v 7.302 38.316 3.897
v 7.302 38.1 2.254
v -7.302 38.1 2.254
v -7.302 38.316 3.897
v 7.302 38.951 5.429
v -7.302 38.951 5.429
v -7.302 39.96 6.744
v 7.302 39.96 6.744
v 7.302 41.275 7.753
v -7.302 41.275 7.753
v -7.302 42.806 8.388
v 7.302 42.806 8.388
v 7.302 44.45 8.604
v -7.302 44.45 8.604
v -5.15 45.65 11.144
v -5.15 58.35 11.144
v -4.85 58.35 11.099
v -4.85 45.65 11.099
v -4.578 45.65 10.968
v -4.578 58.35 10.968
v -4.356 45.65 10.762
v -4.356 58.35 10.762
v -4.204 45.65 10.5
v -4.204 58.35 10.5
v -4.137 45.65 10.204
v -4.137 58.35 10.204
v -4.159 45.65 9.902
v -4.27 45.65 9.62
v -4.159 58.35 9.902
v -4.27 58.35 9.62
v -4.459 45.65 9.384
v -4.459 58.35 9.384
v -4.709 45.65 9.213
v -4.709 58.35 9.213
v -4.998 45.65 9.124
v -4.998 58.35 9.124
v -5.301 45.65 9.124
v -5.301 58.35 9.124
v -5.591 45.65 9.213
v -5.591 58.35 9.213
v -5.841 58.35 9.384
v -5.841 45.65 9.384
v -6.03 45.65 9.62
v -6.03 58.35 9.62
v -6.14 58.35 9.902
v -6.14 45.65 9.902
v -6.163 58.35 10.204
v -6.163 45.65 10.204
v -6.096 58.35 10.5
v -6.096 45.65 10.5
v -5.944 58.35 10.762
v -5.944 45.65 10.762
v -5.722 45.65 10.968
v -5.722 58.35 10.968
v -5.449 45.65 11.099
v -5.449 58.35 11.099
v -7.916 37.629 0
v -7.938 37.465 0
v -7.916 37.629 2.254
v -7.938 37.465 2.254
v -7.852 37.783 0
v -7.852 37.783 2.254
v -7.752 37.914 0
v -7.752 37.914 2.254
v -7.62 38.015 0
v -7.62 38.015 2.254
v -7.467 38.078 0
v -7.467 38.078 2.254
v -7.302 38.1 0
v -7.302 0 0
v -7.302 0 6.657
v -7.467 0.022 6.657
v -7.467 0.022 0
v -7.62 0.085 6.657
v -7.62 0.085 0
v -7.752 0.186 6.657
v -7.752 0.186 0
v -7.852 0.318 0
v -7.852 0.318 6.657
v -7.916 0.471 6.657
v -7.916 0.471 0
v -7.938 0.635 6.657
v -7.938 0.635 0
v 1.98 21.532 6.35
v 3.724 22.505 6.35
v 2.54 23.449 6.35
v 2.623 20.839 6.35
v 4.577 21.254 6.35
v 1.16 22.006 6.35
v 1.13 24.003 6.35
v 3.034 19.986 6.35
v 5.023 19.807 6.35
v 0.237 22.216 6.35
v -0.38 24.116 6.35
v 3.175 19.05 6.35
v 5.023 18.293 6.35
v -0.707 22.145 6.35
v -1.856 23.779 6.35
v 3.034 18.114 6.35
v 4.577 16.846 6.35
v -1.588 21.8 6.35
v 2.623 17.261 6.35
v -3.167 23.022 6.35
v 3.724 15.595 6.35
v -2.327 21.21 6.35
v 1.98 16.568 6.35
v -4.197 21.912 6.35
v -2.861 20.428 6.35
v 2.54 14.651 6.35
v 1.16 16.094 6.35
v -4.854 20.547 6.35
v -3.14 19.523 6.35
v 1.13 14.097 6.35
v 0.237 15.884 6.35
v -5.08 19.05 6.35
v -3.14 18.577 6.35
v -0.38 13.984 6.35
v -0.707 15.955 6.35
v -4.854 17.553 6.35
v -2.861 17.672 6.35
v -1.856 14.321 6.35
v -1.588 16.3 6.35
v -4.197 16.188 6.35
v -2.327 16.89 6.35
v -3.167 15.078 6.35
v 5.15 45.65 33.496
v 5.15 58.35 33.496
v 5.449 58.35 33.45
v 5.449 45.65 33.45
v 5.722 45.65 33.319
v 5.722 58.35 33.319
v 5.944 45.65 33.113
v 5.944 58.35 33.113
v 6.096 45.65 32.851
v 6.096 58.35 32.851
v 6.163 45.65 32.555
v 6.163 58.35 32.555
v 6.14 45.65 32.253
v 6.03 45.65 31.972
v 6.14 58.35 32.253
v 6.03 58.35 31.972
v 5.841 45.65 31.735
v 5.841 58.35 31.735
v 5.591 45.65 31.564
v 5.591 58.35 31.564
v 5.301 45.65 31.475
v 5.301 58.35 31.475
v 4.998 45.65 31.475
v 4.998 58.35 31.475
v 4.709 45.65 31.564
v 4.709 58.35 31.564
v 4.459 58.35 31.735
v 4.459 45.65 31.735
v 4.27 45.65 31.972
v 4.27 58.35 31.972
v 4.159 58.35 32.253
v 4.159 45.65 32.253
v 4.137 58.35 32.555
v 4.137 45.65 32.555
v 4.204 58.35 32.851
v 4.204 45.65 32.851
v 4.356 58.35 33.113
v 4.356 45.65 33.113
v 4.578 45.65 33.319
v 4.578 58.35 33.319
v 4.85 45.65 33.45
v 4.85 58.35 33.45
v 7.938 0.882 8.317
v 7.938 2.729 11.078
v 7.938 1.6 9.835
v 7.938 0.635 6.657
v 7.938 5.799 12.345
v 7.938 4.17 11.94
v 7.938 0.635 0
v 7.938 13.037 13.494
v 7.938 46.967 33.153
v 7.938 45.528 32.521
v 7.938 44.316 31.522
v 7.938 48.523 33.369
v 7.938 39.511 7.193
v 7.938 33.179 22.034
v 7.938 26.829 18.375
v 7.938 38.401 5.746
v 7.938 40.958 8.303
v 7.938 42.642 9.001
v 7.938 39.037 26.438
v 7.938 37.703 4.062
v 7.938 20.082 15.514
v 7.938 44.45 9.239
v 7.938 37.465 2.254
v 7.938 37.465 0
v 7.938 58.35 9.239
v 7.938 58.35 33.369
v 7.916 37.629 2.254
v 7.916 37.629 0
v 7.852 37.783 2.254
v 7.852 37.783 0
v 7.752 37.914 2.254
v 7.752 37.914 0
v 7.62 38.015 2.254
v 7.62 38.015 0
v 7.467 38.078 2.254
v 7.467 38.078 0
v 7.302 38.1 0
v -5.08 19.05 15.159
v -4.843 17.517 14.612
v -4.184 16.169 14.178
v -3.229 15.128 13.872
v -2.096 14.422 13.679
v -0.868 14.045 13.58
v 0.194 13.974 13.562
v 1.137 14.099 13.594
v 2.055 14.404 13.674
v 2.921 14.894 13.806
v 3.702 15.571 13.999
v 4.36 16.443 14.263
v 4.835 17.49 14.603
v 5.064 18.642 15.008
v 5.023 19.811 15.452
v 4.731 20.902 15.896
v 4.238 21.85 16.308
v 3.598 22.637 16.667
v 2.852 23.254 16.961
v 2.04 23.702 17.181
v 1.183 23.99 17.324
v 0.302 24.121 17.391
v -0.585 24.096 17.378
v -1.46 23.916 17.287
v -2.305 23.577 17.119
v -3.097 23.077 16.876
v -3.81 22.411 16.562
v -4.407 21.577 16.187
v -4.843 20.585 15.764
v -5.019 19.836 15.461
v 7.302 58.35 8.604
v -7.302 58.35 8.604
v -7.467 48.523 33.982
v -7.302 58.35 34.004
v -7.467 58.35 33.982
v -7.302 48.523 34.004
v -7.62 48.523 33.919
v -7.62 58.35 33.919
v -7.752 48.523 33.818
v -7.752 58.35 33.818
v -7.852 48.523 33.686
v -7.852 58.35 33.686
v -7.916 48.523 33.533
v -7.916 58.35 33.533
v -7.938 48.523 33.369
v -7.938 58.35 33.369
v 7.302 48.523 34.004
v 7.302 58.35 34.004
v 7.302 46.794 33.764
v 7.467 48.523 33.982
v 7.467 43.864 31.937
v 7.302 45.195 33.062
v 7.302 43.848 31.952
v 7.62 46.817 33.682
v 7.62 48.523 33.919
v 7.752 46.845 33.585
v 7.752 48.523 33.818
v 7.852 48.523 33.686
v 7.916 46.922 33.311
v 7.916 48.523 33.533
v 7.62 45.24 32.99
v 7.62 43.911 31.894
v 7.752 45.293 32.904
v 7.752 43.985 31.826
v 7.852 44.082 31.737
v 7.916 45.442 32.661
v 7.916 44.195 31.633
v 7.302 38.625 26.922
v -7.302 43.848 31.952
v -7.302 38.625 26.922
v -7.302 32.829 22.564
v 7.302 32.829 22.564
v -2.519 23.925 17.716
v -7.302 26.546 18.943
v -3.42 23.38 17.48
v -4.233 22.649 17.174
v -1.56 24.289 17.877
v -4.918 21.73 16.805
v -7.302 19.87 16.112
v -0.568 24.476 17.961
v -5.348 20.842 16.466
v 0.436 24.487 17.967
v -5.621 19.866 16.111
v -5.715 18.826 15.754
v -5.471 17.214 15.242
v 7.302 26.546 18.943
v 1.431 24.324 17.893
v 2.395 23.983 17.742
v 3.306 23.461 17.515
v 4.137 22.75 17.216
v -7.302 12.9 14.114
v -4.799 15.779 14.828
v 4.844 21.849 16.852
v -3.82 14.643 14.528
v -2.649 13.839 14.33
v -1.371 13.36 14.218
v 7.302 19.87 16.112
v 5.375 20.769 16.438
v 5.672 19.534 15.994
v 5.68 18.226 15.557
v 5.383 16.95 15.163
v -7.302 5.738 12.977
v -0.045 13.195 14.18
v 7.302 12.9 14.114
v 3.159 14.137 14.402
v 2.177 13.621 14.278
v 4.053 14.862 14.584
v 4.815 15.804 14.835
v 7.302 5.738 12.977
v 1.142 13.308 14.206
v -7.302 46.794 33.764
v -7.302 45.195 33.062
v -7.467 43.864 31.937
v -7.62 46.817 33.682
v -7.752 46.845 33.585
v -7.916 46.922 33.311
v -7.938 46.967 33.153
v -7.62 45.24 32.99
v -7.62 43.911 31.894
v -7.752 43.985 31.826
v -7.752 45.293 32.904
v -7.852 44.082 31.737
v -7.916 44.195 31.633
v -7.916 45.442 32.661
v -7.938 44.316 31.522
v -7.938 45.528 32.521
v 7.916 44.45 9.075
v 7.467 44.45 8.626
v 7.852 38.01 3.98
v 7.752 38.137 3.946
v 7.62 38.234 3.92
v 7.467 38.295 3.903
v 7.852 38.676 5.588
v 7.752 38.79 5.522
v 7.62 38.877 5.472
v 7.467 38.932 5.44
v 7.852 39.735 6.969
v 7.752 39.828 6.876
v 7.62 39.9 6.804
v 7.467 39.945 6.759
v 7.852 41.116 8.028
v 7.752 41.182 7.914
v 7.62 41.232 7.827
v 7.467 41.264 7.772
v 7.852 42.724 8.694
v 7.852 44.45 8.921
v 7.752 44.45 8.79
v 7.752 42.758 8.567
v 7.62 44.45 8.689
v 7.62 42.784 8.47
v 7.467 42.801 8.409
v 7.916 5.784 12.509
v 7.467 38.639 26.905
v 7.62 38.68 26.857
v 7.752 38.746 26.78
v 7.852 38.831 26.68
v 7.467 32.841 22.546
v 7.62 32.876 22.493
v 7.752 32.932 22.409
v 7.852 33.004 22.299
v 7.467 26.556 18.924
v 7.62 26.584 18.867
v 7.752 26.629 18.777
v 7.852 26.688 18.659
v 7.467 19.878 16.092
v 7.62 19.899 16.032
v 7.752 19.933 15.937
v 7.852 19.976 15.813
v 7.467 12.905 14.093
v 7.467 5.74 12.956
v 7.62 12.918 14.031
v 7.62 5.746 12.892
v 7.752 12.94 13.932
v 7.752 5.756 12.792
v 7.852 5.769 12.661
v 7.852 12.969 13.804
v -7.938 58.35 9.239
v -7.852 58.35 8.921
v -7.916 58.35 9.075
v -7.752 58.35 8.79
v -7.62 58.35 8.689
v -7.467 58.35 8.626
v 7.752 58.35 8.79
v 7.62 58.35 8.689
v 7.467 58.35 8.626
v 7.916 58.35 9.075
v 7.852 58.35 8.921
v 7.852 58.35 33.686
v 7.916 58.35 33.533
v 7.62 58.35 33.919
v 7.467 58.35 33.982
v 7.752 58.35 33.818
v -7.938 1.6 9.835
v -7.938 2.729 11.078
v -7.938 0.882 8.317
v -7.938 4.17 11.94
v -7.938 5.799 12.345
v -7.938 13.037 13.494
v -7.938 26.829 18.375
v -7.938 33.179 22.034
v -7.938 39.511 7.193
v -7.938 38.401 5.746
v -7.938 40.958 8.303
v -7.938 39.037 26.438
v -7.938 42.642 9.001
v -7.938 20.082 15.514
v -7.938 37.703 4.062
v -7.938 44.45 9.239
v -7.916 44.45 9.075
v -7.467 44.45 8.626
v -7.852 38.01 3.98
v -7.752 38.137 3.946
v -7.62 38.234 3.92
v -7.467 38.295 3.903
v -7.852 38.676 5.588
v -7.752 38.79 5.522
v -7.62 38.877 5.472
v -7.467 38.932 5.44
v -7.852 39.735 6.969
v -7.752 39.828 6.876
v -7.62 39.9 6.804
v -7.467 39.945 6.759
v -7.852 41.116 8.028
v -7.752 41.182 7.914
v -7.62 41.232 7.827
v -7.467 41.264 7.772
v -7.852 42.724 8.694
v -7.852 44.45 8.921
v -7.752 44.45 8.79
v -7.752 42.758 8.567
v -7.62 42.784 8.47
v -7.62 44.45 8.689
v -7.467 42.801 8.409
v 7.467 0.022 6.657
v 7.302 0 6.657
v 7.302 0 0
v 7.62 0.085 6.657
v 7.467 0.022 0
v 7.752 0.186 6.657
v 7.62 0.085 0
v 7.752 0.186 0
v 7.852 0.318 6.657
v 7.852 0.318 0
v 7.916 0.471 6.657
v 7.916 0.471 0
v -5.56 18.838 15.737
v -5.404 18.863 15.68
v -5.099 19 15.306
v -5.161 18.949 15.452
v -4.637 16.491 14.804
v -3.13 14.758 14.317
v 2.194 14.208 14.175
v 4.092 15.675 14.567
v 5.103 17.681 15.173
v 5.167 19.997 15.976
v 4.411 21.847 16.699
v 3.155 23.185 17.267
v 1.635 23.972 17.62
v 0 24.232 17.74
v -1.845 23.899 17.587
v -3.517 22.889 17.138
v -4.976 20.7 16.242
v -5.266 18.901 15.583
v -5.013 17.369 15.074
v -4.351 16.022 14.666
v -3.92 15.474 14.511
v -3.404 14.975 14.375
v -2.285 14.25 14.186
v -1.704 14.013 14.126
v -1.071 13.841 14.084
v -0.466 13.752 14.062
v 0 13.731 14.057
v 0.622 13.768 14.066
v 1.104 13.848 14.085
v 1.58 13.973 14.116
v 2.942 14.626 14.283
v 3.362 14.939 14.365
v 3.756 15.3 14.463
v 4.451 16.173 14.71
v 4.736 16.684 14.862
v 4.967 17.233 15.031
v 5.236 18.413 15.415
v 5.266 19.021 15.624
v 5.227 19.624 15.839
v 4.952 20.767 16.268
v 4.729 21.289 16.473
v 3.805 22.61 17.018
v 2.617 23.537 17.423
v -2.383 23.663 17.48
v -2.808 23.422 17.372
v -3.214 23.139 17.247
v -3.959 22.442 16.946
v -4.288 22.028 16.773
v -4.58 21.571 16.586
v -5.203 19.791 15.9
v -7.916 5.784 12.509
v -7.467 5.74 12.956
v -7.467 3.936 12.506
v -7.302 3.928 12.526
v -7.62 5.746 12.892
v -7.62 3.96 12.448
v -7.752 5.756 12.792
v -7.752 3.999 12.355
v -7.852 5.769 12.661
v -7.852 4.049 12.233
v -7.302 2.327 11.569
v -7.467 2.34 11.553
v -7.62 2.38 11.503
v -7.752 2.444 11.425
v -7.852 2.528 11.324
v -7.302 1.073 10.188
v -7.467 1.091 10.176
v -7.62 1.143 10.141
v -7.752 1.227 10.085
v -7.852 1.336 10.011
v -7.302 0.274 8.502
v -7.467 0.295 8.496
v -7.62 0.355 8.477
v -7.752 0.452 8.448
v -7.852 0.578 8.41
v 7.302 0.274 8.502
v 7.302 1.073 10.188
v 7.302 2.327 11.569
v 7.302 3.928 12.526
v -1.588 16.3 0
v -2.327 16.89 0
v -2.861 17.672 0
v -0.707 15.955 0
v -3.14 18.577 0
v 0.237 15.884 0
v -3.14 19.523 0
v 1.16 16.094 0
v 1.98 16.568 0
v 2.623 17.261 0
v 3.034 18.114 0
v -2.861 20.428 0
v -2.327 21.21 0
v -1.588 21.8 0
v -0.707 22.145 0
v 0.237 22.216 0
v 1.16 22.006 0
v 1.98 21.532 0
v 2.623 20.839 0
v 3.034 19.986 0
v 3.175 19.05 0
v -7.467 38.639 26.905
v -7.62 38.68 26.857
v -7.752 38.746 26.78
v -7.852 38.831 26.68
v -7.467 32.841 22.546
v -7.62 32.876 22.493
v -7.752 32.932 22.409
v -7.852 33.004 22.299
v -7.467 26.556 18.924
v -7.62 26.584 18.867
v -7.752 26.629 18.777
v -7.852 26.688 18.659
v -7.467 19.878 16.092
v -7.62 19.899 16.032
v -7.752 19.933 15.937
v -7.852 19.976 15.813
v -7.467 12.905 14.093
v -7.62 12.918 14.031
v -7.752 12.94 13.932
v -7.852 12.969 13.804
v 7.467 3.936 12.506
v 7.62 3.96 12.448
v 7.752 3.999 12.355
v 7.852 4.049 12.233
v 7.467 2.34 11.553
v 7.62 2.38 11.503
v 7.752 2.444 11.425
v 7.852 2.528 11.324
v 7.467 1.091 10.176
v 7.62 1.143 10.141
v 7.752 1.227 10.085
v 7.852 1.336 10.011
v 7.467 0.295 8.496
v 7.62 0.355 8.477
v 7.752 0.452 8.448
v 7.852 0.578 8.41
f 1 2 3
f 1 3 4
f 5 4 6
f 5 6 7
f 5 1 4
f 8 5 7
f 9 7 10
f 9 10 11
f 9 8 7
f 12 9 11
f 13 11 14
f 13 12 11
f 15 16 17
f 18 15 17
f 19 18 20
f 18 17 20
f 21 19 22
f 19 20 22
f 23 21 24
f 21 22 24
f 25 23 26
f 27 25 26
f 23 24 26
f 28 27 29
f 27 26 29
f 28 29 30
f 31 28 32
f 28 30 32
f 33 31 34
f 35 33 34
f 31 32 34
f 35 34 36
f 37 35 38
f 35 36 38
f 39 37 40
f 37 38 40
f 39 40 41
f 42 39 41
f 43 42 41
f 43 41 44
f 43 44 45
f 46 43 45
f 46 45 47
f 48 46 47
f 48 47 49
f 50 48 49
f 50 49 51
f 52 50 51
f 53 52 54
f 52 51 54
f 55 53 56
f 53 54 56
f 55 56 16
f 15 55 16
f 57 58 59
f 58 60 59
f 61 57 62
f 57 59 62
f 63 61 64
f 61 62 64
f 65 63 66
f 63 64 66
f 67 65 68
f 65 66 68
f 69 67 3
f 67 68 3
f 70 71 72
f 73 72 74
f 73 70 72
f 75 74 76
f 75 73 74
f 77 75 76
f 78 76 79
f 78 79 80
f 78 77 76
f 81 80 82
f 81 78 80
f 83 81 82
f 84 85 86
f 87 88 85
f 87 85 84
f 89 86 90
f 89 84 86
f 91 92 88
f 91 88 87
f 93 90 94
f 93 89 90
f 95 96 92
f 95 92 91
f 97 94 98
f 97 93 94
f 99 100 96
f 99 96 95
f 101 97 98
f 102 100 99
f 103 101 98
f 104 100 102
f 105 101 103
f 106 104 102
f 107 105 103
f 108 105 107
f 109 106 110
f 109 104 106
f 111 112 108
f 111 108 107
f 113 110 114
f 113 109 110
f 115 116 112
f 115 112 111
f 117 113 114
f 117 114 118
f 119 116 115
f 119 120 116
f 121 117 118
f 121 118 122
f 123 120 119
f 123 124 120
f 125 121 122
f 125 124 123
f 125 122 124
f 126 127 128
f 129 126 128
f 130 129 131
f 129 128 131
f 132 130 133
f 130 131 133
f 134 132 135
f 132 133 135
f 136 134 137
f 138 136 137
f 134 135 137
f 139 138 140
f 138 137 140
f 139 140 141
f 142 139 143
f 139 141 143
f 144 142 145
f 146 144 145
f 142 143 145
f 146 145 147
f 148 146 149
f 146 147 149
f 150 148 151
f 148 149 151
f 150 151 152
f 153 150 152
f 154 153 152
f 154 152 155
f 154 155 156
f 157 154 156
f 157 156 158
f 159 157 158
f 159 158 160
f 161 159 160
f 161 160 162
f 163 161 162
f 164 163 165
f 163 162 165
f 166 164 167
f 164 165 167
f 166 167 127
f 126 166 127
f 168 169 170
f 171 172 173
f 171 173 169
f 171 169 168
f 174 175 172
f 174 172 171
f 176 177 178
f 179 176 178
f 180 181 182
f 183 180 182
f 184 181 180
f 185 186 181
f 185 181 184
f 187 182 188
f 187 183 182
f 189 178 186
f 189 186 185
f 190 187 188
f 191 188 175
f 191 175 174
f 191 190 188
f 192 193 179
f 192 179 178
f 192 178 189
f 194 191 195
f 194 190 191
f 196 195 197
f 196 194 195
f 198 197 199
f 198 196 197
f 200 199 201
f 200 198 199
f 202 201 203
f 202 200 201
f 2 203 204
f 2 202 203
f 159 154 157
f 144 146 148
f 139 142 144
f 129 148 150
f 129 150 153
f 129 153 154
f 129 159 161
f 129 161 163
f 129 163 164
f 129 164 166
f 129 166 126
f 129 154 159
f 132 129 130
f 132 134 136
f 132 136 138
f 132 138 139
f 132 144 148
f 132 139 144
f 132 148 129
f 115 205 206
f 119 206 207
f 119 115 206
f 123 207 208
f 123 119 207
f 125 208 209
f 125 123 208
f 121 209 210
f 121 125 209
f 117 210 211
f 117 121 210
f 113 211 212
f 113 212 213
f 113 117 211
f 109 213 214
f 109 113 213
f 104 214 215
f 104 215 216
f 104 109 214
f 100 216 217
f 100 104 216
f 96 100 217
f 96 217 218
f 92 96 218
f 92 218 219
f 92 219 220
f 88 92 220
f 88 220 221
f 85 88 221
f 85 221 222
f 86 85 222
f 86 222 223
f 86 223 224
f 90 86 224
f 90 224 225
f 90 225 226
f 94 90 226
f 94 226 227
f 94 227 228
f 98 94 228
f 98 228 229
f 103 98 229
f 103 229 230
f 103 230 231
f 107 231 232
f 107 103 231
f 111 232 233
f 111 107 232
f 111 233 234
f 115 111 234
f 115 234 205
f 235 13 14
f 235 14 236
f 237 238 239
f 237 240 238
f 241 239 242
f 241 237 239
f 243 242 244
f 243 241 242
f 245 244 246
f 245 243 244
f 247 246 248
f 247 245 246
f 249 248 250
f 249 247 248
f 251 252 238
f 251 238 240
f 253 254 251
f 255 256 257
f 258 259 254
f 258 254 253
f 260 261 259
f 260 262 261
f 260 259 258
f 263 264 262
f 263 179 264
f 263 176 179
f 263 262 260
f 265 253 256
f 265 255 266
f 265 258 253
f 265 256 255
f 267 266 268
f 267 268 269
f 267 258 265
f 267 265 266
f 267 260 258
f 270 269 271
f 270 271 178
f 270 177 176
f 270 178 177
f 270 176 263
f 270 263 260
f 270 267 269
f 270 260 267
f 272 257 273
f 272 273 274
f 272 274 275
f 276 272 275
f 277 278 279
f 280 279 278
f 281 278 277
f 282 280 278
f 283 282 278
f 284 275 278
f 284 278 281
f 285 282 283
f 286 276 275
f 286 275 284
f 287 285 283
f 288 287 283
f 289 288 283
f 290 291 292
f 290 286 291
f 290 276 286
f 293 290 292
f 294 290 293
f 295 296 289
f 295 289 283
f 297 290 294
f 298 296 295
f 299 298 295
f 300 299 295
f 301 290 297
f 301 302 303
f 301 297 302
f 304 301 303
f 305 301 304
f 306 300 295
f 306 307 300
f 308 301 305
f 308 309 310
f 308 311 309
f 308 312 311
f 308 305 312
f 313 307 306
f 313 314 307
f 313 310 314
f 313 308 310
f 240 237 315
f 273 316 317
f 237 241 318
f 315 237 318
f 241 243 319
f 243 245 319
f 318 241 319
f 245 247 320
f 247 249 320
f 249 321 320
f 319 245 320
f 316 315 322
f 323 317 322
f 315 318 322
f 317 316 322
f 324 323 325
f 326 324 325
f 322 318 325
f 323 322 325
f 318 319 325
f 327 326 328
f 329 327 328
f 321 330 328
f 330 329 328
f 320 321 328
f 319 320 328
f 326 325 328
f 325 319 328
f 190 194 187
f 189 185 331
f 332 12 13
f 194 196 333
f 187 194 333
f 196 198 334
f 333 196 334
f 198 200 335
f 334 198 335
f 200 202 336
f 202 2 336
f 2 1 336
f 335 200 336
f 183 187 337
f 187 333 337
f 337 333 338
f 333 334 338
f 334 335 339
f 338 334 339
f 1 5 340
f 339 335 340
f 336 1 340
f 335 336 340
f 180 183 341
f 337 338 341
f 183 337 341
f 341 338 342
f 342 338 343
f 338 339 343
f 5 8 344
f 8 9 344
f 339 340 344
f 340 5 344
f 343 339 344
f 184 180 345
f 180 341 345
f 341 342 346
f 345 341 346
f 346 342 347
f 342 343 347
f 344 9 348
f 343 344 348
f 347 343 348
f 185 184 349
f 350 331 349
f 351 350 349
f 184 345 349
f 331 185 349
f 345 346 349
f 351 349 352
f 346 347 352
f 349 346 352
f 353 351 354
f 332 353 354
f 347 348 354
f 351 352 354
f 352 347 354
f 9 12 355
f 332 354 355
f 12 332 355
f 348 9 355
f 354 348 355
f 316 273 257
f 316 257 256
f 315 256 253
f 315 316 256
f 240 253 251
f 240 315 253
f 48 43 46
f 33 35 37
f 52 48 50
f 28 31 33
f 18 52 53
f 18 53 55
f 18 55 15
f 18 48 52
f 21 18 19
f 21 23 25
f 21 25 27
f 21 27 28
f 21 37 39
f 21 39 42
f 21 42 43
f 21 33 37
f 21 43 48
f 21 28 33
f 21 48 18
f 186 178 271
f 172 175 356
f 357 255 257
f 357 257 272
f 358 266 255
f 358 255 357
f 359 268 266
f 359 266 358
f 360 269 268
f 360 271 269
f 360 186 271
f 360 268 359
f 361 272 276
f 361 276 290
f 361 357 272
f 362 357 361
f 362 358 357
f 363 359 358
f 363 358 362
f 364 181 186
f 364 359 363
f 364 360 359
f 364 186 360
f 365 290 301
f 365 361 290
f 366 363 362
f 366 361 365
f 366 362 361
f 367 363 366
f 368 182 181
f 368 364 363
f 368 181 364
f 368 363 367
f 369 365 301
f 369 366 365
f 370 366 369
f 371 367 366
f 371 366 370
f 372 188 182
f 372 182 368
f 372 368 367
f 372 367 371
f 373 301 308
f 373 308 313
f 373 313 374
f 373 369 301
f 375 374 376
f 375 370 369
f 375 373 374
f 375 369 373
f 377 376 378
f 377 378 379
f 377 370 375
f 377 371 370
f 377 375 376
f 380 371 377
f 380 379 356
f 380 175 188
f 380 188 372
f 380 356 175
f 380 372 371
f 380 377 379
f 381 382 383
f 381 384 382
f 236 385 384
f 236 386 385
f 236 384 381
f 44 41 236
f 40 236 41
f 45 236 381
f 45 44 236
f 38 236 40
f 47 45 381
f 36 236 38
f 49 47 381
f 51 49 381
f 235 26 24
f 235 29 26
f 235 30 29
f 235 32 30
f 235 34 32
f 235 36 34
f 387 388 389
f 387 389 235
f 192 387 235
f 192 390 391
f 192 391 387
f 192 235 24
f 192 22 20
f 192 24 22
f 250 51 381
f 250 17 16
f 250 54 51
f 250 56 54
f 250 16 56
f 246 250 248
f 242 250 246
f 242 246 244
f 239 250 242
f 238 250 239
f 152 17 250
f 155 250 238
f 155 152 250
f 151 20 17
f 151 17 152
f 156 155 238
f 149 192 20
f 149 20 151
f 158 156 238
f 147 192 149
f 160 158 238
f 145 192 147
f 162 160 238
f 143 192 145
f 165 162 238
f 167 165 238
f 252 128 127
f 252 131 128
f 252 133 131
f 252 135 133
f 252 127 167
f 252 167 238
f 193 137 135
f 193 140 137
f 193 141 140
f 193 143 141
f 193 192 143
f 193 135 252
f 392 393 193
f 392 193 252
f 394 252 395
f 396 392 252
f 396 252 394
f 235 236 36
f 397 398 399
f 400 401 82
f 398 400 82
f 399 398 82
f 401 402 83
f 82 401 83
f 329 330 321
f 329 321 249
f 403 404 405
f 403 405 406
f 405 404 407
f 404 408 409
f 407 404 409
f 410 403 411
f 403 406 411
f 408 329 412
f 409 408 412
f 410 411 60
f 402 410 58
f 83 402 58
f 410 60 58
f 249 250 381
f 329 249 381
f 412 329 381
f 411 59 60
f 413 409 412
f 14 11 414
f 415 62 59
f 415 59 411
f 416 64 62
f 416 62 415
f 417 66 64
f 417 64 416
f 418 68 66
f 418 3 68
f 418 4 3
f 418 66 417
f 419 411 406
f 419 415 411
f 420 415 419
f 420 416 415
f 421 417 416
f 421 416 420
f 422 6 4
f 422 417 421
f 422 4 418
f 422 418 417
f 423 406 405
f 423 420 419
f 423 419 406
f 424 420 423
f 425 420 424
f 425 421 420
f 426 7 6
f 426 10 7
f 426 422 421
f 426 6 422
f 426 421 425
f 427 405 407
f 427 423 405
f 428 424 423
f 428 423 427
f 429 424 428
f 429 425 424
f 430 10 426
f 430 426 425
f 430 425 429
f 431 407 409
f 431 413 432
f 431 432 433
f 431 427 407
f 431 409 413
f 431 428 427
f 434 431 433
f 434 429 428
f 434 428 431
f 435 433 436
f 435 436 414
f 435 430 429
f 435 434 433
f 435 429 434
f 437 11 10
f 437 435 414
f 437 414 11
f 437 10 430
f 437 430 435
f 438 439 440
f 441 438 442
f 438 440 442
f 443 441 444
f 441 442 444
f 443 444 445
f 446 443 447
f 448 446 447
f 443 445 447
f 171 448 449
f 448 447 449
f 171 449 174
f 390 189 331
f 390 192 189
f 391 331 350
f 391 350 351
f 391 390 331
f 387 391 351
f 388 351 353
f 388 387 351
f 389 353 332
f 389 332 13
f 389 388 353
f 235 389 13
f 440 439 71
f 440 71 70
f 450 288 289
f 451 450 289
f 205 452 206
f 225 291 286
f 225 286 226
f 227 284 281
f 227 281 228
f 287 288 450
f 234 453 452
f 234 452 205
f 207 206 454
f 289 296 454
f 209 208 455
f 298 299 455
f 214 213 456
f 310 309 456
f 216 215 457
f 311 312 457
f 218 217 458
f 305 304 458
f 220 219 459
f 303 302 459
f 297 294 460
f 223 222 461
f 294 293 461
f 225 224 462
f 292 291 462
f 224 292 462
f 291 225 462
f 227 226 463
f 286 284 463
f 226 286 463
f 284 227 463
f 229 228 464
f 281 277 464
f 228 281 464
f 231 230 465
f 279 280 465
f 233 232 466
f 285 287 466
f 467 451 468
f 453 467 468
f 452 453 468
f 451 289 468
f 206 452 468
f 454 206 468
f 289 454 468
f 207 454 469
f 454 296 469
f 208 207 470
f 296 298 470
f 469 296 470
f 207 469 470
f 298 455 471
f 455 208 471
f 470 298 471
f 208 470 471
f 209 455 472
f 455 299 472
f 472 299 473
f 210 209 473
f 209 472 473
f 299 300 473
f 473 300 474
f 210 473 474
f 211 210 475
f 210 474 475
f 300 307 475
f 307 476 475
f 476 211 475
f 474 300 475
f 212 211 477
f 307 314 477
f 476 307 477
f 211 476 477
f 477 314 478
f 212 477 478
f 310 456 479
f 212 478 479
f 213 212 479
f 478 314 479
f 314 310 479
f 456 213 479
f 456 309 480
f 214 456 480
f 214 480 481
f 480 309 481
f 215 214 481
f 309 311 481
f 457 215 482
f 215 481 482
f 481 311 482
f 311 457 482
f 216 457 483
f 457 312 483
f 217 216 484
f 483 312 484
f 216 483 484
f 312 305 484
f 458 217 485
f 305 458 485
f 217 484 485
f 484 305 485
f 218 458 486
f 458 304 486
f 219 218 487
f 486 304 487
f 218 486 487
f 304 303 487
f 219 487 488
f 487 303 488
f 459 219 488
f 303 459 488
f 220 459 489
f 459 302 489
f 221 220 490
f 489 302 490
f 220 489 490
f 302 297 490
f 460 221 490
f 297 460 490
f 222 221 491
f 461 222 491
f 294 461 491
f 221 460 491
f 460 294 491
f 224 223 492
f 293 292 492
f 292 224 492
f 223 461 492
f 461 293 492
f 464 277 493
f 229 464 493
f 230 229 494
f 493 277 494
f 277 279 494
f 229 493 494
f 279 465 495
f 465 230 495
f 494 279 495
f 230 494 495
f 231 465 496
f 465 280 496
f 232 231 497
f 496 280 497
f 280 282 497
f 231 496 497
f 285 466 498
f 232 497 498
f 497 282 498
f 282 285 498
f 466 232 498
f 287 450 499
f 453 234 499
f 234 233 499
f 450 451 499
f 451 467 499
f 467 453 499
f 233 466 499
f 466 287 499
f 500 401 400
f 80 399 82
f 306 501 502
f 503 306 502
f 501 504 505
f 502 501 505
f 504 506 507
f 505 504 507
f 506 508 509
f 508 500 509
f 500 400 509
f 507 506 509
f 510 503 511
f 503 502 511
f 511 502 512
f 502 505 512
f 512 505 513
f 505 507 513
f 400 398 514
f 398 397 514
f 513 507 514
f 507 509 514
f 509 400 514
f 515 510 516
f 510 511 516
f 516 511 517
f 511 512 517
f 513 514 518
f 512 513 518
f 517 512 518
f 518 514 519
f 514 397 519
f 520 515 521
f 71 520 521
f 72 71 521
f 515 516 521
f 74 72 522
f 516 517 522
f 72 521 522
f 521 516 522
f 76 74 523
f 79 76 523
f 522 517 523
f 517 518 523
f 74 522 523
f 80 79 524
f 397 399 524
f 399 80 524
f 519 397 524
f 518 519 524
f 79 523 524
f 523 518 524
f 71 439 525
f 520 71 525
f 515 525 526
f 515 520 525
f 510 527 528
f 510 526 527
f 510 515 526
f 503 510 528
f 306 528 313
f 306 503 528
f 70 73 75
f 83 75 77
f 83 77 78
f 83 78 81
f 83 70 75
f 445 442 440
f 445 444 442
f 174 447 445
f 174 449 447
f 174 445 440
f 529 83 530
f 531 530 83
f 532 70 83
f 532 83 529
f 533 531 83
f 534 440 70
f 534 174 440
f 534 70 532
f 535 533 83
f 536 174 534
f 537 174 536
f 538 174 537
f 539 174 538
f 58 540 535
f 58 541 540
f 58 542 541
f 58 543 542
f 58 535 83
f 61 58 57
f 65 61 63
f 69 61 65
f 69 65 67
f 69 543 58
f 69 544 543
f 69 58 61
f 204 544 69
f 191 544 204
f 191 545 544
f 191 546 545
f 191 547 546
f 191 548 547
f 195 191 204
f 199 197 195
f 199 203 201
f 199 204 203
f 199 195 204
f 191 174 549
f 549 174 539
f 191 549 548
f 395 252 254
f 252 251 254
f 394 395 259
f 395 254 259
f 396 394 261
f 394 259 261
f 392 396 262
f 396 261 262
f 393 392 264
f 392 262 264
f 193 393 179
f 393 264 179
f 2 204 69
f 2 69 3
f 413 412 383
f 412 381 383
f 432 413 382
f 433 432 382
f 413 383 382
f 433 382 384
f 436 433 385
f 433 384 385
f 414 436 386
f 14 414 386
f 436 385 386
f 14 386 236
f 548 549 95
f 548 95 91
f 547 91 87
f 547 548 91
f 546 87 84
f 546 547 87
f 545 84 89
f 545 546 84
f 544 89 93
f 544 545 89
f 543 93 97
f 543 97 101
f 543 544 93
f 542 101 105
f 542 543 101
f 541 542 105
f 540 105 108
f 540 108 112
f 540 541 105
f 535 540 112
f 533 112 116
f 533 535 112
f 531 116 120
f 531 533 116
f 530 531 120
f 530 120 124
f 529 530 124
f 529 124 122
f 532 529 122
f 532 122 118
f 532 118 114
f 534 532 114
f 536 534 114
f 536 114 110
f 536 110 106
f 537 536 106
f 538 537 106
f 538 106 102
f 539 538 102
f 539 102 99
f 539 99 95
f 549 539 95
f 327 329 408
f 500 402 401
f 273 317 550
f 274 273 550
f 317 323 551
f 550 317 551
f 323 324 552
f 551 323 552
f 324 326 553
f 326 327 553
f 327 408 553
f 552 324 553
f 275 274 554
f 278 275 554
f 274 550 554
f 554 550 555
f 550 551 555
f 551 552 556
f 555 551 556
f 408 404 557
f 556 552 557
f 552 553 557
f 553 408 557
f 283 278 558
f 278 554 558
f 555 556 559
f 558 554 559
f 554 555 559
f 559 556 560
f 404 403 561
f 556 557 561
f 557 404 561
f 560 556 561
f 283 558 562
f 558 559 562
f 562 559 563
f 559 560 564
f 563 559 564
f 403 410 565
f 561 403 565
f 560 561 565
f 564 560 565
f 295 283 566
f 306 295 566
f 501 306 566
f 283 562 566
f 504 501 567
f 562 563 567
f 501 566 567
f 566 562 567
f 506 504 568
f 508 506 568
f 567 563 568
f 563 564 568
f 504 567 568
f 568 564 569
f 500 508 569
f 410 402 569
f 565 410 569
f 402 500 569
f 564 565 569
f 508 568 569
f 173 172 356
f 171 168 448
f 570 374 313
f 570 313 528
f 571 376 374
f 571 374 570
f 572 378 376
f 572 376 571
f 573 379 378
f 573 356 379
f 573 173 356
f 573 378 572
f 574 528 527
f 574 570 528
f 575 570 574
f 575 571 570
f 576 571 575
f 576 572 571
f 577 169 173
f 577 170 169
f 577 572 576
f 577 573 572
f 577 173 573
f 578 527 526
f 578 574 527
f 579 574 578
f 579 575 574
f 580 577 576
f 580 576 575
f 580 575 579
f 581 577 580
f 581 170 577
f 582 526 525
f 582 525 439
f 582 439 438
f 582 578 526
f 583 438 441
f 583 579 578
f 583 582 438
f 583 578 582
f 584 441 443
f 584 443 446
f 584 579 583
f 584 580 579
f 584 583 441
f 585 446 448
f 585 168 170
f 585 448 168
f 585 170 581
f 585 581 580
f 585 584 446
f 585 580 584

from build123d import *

# Parameters (mm, degrees)
BOSS_EXTRUDE1_DEPTH     = 7.9375
CUT_EXTRUDE1_DEPTH      = 69.000110012
CUT_EXTRUDE1_DEPTH_BACK = 69.000110012
SKETCH2_R               = 3.175
CUT_EXTRUDE4_START      = 6.35
SKETCH2_3_R             = 5.08
SKETCH2_3_R_2           = 3.175
CUT_EXTRUDE4_DEPTH      = 62.650110074
SKETCH3_R               = 1.016
CUT_EXTRUDE2_DEPTH      = 12.7
FILLET1_R               = 6.35
FILLET2_R               = 0.635


with BuildPart() as part:
    # Sketch1 → Boss-Extrude1 (new, symmetric)
    with BuildSketch(Plane(origin=(0, 0, 0), x_dir=(0, 0, -1), z_dir=(1, 0, 0))):
        with BuildLine():
            Line((-12.7, 0), (0, 0))
            Line((0, 0), (0, 38.1))
            Line((0, 38.1), (-8.603985801, 38.1))
            Line((-8.603985801, 38.1), (-8.603985801, 58.35015))
            Line((-8.603985801, 58.35015), (-34.003985801, 58.35015))
            Line((-34.003985801, 58.35015), (-34.003985801, 45.65015))
            ThreePointArc((-34.003985801, 45.65015), (-18.28813969, 25.18827111), (-12.7, 0))
        make_face()
    extrude(amount=BOSS_EXTRUDE1_DEPTH, both=True)

    # Sketch2 → Cut-Extrude1 (cut, two sides: drawn at the far end of the back side and taken through both)
    with BuildSketch(Plane.XY.offset(-CUT_EXTRUDE1_DEPTH_BACK)):
        with Locations((0, 19.05)):
            Circle(SKETCH2_R)
    extrude(amount=CUT_EXTRUDE1_DEPTH + CUT_EXTRUDE1_DEPTH_BACK, mode=Mode.SUBTRACT)

    # Sketch2<3> → Cut-Extrude4 (cut, through all)
    with BuildSketch(Plane.XY.offset(CUT_EXTRUDE4_START)):
        with Locations((0, 19.05)):
            Circle(SKETCH2_3_R)
        with Locations((0, 19.05)):
            Circle(SKETCH2_3_R_2, mode=Mode.SUBTRACT)
    extrude(amount=CUT_EXTRUDE4_DEPTH, mode=Mode.SUBTRACT)

    # Sketch3 → Cut-Extrude2 (cut)
    with BuildSketch(Plane(origin=(0, 58.35015, 0), x_dir=(1, 0, 0), z_dir=(0, 1, 0))):
        with Locations((-5.14985, -10.128440702)):
            Circle(SKETCH3_R)
        with Locations((5.14985, -32.479530901)):
            Circle(SKETCH3_R)
    extrude(amount=-CUT_EXTRUDE2_DEPTH, mode=Mode.SUBTRACT)

    # Fillet1
    fillet1_edges = [part.edges().sort_by_distance(p)[0] for p in [
        (0, 38.1, 8.603985801),
        (0, 0, 12.7),
        (0, 45.65015, 34.003985801),
    ]]
    fillet(fillet1_edges, radius=FILLET1_R)

    # Fillet2
    fillet2_edges = [part.edges().sort_by_distance(p)[0] for p in [
        (-7.9375, 38.1, 1.126992901),
        (-7.9375, 39.959871939, 6.744113862),
        (7.9375, 38.1, 1.126992901),
        (7.9375, 39.959871939, 6.744113862),
        (-7.9375, 0, 3.328298297),
        (-7.9375, 1.648552323, 10.924955733),
        (-7.9375, 26.546479972, 18.943050417),
        (-7.9375, 45.970406475, 33.468275281),
        (7.9375, 0, 3.328298297),
        (7.9375, 1.648552323, 10.924955733),
        (7.9375, 26.546479972, 18.943050417),
        (7.9375, 45.970406475, 33.468275281),
        (-7.9375, 51.400075, 8.603985801),
        (7.9375, 51.400075, 8.603985801),
        (-7.9375, 53.436653755, 34.003985801),
        (7.9375, 53.436653755, 34.003985801),
        (-5.078897735, 19.155819437, 15.864451719),
    ]]
    fillet(fillet2_edges, radius=FILLET2_R)


solid = part.part
